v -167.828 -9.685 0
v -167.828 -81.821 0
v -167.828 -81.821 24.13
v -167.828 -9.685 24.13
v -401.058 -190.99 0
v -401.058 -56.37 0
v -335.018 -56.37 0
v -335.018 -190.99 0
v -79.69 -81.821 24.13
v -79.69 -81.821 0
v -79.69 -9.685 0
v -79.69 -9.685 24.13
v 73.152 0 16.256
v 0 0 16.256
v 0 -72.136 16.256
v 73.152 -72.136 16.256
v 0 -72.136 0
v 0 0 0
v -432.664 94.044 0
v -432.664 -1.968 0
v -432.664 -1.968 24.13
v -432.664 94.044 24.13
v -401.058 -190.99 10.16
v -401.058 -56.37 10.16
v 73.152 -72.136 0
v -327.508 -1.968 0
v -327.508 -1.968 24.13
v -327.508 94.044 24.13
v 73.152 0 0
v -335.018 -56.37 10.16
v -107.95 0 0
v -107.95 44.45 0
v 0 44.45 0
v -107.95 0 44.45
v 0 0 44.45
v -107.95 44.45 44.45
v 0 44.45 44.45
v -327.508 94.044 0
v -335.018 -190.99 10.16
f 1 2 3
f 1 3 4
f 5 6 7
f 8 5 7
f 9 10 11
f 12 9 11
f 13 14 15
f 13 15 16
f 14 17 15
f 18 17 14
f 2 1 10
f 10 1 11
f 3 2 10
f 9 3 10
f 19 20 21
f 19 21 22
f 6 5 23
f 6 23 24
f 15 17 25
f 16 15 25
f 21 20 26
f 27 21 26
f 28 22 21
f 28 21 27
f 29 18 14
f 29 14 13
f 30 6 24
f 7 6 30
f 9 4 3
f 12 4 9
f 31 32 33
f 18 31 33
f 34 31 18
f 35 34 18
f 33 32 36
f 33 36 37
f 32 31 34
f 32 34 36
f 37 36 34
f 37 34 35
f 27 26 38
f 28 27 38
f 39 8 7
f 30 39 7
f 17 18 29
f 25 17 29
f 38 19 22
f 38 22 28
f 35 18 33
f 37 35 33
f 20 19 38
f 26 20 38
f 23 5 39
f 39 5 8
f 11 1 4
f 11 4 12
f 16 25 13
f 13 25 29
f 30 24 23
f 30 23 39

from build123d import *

# Parameters (mm, degrees)
F0_W     = 107.95
F0_H     = 44.45
F1_DEPTH = 44.45
F2_W     = 73.152
F2_H     = 72.136
F3_DEPTH = 16.256
F4_W     = 88.138
F4_H     = 72.136
F5_DEPTH = 24.13
F6_W     = 105.156
F6_H     = 96.012
F7_DEPTH = 24.13
F8_W     = 66.04
F8_H     = 134.62
F9_DEPTH = 10.16


with BuildPart() as f1:
    # F0 (on Top) → F1 (new body)
    with BuildSketch(Plane.XY):
        with Locations((-53.975, 22.225)):
            Rectangle(F0_W, F0_H)
    extrude(amount=F1_DEPTH)


with BuildPart() as f3:
    # F2 (on Top) → F3 (new body)
    with BuildSketch(Plane.XY):
        with Locations((36.576, -36.068)):
            Rectangle(F2_W, F2_H)
    extrude(amount=F3_DEPTH)


with BuildPart() as f5:
    # F4 (on Top) → F5 (new body)
    with BuildSketch(Plane.XY):
        with Locations((-123.758521, -45.752846)):
            Rectangle(F4_W, F4_H)
    extrude(amount=F5_DEPTH)


with BuildPart() as f7:
    # F6 (on Top) → F7 (new body)
    with BuildSketch(Plane.XY):
        with Locations((-380.085857, 46.037666)):
            Rectangle(F6_W, F6_H)
    extrude(amount=F7_DEPTH)


with BuildPart() as f9:
    # F8 (on Top) → F9 (new body)
    with BuildSketch(Plane.XY):
        with Locations((-368.037514, -123.680122)):
            Rectangle(F8_W, F8_H)
    extrude(amount=F9_DEPTH)


solid = Compound([f1.part, f3.part, f5.part, f7.part, f9.part])
